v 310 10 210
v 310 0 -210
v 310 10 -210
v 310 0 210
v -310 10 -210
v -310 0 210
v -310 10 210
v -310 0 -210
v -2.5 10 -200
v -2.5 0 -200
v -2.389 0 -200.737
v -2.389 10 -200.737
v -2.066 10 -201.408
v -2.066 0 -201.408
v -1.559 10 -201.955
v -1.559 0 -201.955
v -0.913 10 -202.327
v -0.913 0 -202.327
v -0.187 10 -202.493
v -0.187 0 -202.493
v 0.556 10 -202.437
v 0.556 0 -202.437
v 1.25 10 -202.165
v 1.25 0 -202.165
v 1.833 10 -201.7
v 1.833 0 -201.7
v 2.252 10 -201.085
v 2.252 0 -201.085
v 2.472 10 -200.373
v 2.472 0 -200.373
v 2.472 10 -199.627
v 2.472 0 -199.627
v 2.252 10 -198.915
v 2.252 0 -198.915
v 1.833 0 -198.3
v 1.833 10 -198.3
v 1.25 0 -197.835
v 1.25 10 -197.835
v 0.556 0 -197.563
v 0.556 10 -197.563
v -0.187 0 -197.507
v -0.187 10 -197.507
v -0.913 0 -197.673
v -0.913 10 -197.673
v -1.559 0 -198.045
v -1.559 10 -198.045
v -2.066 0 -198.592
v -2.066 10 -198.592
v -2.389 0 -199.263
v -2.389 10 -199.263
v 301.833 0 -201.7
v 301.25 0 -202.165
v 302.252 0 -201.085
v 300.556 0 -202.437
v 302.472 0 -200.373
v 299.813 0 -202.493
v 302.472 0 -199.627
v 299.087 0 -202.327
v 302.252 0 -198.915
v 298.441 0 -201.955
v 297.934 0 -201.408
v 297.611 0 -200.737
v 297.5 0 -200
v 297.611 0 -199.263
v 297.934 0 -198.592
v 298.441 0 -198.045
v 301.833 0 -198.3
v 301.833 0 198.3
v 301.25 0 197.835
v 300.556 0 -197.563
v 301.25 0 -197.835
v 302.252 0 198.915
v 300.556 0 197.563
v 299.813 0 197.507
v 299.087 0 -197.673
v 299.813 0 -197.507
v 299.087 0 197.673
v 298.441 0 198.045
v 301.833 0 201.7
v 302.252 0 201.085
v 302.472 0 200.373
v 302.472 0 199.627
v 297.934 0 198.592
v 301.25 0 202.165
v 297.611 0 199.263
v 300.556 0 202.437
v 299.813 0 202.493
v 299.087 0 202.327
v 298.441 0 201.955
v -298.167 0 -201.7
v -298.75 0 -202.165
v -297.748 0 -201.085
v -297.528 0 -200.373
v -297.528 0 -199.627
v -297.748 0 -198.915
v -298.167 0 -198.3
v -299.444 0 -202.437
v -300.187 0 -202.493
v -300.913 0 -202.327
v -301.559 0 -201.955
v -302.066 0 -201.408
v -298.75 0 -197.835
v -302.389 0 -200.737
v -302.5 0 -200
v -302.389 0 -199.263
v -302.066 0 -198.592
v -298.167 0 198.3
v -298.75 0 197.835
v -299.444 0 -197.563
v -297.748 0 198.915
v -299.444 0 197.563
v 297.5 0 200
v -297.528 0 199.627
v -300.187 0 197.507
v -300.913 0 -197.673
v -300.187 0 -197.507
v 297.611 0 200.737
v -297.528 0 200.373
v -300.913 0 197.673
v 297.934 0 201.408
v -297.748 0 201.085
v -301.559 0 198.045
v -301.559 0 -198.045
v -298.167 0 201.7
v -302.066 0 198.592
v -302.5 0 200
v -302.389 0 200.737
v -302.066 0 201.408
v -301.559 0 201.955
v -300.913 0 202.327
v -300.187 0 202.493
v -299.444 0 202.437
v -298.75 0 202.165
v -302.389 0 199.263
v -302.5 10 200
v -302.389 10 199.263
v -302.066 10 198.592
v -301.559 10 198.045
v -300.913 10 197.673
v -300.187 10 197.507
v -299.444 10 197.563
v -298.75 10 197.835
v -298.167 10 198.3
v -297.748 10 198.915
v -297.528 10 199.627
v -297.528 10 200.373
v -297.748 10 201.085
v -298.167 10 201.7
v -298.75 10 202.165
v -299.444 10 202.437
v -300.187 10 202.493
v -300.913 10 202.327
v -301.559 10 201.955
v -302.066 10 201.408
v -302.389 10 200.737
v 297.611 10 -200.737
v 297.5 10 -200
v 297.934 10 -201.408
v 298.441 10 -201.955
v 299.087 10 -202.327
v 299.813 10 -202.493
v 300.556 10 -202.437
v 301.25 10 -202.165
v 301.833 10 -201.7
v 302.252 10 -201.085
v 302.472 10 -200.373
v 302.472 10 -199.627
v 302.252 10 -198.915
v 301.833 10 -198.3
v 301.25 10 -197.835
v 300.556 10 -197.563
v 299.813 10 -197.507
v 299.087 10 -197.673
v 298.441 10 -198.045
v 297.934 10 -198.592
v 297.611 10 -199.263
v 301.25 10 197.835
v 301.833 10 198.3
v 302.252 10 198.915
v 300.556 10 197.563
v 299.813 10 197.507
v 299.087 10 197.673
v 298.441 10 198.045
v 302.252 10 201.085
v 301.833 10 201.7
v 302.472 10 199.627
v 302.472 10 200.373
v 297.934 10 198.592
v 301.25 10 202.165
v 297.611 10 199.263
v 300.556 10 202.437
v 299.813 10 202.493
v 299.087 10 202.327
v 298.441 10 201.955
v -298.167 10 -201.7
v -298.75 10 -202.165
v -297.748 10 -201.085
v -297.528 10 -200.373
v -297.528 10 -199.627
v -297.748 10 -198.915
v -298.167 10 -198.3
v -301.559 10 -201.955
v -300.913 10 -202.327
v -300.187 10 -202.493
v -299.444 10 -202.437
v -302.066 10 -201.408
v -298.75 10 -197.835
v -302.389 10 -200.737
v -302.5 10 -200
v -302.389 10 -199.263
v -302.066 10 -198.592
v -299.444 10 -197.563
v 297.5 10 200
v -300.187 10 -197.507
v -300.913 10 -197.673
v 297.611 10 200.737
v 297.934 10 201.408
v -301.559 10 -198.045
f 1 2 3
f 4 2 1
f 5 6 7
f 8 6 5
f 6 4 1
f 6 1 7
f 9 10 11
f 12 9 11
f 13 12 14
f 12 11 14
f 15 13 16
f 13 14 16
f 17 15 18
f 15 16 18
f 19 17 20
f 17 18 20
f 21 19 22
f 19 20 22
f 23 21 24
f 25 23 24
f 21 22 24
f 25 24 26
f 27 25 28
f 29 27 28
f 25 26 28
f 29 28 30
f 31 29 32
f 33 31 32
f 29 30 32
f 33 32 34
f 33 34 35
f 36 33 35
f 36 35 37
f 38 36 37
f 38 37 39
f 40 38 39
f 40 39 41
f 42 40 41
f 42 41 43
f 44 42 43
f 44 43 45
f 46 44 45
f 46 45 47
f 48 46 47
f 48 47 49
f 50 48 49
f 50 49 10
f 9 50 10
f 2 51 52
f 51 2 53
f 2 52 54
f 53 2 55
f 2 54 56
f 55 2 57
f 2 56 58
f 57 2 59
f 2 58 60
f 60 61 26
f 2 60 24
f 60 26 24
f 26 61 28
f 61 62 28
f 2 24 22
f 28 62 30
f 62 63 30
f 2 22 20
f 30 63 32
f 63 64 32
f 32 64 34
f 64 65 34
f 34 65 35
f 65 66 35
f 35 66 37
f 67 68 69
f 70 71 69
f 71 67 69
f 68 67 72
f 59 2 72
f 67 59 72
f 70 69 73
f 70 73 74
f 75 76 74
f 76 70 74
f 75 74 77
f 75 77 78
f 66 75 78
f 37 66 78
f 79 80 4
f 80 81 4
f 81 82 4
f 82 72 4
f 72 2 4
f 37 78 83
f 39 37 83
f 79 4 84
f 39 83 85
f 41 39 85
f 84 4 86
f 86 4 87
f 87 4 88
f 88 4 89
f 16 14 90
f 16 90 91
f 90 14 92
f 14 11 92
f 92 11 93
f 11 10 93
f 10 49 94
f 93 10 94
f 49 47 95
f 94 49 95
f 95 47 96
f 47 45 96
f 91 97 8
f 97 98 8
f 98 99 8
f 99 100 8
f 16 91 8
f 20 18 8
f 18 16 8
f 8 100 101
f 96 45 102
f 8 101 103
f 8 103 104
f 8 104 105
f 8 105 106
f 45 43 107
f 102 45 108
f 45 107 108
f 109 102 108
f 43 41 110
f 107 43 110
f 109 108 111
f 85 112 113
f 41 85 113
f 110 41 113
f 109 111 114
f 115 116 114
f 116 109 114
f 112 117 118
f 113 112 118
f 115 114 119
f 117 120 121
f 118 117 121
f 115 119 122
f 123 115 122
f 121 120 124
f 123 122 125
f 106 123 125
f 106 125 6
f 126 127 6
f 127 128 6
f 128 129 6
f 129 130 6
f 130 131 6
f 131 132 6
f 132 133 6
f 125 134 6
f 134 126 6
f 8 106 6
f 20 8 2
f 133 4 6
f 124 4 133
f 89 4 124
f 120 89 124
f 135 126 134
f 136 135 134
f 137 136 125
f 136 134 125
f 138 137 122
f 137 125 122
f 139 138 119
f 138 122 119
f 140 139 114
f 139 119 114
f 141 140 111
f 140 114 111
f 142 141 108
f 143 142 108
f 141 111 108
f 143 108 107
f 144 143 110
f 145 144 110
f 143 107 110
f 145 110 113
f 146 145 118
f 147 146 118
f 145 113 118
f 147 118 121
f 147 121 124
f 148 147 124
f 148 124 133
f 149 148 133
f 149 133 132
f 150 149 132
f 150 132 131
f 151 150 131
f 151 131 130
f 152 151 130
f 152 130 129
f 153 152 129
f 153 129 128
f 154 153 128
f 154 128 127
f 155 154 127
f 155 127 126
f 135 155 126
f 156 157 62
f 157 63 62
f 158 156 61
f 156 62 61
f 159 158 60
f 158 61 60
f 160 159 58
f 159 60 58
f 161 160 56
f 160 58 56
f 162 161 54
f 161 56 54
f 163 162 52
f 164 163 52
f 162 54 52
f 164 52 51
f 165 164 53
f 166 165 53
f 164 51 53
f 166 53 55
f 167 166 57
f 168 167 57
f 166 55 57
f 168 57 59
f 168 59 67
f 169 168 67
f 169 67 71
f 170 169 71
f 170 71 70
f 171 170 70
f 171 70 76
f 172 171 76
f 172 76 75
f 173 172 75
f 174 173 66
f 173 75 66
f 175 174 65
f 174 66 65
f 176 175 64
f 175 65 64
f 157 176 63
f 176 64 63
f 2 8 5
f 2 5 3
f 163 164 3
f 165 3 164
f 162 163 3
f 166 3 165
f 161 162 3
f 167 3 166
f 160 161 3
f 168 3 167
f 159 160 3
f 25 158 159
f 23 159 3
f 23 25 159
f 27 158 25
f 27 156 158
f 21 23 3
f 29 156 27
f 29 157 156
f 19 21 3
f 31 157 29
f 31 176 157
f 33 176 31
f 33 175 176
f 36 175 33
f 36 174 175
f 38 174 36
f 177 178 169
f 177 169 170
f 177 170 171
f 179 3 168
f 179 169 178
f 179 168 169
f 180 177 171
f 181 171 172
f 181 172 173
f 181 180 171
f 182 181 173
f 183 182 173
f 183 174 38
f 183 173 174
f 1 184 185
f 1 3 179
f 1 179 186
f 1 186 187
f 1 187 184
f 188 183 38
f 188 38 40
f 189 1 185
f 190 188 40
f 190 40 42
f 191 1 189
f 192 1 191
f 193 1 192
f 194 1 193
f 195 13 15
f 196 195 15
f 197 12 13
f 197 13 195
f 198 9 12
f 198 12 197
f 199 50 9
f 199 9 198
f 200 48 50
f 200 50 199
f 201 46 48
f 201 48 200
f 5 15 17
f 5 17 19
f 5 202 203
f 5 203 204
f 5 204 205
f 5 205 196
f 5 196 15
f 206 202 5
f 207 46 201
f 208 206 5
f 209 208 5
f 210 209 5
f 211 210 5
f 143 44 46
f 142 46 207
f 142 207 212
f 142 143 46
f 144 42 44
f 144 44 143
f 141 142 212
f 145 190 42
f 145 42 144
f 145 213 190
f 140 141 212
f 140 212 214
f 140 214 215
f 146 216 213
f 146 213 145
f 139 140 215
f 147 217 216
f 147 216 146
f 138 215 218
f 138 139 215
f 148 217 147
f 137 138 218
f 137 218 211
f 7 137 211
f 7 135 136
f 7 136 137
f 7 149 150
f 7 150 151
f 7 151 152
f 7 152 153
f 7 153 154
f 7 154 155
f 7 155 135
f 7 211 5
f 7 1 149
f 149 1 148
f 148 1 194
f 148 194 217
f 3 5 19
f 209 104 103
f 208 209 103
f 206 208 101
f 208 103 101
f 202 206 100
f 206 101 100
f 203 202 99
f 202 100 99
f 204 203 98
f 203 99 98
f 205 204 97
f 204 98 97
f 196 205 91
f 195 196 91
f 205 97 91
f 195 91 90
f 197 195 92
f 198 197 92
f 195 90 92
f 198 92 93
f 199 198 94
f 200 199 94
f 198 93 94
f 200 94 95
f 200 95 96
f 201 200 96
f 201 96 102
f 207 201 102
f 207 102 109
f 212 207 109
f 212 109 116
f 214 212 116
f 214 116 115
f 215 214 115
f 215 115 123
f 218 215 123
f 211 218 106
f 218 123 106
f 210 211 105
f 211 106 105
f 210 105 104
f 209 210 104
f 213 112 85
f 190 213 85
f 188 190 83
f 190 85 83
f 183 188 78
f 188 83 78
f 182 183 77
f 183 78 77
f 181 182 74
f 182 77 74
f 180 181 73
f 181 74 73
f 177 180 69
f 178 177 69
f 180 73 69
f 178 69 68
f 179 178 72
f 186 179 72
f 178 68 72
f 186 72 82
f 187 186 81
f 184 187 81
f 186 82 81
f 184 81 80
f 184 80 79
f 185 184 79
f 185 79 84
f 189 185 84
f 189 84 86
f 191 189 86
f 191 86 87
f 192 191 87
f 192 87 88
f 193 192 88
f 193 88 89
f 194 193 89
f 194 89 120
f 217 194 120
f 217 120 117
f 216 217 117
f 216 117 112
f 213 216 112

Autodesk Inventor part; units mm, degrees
ref_plane "YZ Plane" through (0, 0, 0) normal (1, 0, 0) x (0, 1, 0)
ref_plane "XZ Plane" through (0, 0, 0) normal (0, 1, 0) x (-1, 0, 0)
ref_plane "XY Plane" through (0, 0, 0) normal (0, 0, 1) x (1, 0, 0)
sketch "Sketch1" plane through (0, 0, 0) normal (0, 1, 0) x (-1, 0, 0)
  line L0 (-310, 210) -> (310, 210)
  line L1 (310, 210) -> (310, -210)
  line L2 (310, -210) -> (-310, -210)
  line L3 (-310, -210) -> (-310, 210)
  line L4 (-300, -200) -> (300, -200)
  line L5 (300, -200) -> (300, 200)
  line L6 (300, 200) -> (-300, 200)
  line L7 (-300, 200) -> (-300, -200)
  circle A0 centre (300, -200) radius 2.5
  circle A1 centre (-300, -200) radius 2.5
  circle A2 centre (0, -200) radius 2.5
  circle A3 centre (300, 200) radius 2.5
  circle A4 centre (-300, 200) radius 2.5
  point P0 (0, 0)
  dimension "d0" = 620
  dimension "d1" = 420
  dimension "d2" = 10
  dimension "d3" = 5
  dimension "d4" = 5
  dimension "d5" = 5
  dimension "d6" = 5
  dimension "d7" = 5
extrude "Extrusion1" add sketch "Sketch1" along normal blind 10 contours L0 L1 L2 L3 | A1 L7 A4 L6 A3 L5 A0 L4 A2
properties part number "CaraLateral"
